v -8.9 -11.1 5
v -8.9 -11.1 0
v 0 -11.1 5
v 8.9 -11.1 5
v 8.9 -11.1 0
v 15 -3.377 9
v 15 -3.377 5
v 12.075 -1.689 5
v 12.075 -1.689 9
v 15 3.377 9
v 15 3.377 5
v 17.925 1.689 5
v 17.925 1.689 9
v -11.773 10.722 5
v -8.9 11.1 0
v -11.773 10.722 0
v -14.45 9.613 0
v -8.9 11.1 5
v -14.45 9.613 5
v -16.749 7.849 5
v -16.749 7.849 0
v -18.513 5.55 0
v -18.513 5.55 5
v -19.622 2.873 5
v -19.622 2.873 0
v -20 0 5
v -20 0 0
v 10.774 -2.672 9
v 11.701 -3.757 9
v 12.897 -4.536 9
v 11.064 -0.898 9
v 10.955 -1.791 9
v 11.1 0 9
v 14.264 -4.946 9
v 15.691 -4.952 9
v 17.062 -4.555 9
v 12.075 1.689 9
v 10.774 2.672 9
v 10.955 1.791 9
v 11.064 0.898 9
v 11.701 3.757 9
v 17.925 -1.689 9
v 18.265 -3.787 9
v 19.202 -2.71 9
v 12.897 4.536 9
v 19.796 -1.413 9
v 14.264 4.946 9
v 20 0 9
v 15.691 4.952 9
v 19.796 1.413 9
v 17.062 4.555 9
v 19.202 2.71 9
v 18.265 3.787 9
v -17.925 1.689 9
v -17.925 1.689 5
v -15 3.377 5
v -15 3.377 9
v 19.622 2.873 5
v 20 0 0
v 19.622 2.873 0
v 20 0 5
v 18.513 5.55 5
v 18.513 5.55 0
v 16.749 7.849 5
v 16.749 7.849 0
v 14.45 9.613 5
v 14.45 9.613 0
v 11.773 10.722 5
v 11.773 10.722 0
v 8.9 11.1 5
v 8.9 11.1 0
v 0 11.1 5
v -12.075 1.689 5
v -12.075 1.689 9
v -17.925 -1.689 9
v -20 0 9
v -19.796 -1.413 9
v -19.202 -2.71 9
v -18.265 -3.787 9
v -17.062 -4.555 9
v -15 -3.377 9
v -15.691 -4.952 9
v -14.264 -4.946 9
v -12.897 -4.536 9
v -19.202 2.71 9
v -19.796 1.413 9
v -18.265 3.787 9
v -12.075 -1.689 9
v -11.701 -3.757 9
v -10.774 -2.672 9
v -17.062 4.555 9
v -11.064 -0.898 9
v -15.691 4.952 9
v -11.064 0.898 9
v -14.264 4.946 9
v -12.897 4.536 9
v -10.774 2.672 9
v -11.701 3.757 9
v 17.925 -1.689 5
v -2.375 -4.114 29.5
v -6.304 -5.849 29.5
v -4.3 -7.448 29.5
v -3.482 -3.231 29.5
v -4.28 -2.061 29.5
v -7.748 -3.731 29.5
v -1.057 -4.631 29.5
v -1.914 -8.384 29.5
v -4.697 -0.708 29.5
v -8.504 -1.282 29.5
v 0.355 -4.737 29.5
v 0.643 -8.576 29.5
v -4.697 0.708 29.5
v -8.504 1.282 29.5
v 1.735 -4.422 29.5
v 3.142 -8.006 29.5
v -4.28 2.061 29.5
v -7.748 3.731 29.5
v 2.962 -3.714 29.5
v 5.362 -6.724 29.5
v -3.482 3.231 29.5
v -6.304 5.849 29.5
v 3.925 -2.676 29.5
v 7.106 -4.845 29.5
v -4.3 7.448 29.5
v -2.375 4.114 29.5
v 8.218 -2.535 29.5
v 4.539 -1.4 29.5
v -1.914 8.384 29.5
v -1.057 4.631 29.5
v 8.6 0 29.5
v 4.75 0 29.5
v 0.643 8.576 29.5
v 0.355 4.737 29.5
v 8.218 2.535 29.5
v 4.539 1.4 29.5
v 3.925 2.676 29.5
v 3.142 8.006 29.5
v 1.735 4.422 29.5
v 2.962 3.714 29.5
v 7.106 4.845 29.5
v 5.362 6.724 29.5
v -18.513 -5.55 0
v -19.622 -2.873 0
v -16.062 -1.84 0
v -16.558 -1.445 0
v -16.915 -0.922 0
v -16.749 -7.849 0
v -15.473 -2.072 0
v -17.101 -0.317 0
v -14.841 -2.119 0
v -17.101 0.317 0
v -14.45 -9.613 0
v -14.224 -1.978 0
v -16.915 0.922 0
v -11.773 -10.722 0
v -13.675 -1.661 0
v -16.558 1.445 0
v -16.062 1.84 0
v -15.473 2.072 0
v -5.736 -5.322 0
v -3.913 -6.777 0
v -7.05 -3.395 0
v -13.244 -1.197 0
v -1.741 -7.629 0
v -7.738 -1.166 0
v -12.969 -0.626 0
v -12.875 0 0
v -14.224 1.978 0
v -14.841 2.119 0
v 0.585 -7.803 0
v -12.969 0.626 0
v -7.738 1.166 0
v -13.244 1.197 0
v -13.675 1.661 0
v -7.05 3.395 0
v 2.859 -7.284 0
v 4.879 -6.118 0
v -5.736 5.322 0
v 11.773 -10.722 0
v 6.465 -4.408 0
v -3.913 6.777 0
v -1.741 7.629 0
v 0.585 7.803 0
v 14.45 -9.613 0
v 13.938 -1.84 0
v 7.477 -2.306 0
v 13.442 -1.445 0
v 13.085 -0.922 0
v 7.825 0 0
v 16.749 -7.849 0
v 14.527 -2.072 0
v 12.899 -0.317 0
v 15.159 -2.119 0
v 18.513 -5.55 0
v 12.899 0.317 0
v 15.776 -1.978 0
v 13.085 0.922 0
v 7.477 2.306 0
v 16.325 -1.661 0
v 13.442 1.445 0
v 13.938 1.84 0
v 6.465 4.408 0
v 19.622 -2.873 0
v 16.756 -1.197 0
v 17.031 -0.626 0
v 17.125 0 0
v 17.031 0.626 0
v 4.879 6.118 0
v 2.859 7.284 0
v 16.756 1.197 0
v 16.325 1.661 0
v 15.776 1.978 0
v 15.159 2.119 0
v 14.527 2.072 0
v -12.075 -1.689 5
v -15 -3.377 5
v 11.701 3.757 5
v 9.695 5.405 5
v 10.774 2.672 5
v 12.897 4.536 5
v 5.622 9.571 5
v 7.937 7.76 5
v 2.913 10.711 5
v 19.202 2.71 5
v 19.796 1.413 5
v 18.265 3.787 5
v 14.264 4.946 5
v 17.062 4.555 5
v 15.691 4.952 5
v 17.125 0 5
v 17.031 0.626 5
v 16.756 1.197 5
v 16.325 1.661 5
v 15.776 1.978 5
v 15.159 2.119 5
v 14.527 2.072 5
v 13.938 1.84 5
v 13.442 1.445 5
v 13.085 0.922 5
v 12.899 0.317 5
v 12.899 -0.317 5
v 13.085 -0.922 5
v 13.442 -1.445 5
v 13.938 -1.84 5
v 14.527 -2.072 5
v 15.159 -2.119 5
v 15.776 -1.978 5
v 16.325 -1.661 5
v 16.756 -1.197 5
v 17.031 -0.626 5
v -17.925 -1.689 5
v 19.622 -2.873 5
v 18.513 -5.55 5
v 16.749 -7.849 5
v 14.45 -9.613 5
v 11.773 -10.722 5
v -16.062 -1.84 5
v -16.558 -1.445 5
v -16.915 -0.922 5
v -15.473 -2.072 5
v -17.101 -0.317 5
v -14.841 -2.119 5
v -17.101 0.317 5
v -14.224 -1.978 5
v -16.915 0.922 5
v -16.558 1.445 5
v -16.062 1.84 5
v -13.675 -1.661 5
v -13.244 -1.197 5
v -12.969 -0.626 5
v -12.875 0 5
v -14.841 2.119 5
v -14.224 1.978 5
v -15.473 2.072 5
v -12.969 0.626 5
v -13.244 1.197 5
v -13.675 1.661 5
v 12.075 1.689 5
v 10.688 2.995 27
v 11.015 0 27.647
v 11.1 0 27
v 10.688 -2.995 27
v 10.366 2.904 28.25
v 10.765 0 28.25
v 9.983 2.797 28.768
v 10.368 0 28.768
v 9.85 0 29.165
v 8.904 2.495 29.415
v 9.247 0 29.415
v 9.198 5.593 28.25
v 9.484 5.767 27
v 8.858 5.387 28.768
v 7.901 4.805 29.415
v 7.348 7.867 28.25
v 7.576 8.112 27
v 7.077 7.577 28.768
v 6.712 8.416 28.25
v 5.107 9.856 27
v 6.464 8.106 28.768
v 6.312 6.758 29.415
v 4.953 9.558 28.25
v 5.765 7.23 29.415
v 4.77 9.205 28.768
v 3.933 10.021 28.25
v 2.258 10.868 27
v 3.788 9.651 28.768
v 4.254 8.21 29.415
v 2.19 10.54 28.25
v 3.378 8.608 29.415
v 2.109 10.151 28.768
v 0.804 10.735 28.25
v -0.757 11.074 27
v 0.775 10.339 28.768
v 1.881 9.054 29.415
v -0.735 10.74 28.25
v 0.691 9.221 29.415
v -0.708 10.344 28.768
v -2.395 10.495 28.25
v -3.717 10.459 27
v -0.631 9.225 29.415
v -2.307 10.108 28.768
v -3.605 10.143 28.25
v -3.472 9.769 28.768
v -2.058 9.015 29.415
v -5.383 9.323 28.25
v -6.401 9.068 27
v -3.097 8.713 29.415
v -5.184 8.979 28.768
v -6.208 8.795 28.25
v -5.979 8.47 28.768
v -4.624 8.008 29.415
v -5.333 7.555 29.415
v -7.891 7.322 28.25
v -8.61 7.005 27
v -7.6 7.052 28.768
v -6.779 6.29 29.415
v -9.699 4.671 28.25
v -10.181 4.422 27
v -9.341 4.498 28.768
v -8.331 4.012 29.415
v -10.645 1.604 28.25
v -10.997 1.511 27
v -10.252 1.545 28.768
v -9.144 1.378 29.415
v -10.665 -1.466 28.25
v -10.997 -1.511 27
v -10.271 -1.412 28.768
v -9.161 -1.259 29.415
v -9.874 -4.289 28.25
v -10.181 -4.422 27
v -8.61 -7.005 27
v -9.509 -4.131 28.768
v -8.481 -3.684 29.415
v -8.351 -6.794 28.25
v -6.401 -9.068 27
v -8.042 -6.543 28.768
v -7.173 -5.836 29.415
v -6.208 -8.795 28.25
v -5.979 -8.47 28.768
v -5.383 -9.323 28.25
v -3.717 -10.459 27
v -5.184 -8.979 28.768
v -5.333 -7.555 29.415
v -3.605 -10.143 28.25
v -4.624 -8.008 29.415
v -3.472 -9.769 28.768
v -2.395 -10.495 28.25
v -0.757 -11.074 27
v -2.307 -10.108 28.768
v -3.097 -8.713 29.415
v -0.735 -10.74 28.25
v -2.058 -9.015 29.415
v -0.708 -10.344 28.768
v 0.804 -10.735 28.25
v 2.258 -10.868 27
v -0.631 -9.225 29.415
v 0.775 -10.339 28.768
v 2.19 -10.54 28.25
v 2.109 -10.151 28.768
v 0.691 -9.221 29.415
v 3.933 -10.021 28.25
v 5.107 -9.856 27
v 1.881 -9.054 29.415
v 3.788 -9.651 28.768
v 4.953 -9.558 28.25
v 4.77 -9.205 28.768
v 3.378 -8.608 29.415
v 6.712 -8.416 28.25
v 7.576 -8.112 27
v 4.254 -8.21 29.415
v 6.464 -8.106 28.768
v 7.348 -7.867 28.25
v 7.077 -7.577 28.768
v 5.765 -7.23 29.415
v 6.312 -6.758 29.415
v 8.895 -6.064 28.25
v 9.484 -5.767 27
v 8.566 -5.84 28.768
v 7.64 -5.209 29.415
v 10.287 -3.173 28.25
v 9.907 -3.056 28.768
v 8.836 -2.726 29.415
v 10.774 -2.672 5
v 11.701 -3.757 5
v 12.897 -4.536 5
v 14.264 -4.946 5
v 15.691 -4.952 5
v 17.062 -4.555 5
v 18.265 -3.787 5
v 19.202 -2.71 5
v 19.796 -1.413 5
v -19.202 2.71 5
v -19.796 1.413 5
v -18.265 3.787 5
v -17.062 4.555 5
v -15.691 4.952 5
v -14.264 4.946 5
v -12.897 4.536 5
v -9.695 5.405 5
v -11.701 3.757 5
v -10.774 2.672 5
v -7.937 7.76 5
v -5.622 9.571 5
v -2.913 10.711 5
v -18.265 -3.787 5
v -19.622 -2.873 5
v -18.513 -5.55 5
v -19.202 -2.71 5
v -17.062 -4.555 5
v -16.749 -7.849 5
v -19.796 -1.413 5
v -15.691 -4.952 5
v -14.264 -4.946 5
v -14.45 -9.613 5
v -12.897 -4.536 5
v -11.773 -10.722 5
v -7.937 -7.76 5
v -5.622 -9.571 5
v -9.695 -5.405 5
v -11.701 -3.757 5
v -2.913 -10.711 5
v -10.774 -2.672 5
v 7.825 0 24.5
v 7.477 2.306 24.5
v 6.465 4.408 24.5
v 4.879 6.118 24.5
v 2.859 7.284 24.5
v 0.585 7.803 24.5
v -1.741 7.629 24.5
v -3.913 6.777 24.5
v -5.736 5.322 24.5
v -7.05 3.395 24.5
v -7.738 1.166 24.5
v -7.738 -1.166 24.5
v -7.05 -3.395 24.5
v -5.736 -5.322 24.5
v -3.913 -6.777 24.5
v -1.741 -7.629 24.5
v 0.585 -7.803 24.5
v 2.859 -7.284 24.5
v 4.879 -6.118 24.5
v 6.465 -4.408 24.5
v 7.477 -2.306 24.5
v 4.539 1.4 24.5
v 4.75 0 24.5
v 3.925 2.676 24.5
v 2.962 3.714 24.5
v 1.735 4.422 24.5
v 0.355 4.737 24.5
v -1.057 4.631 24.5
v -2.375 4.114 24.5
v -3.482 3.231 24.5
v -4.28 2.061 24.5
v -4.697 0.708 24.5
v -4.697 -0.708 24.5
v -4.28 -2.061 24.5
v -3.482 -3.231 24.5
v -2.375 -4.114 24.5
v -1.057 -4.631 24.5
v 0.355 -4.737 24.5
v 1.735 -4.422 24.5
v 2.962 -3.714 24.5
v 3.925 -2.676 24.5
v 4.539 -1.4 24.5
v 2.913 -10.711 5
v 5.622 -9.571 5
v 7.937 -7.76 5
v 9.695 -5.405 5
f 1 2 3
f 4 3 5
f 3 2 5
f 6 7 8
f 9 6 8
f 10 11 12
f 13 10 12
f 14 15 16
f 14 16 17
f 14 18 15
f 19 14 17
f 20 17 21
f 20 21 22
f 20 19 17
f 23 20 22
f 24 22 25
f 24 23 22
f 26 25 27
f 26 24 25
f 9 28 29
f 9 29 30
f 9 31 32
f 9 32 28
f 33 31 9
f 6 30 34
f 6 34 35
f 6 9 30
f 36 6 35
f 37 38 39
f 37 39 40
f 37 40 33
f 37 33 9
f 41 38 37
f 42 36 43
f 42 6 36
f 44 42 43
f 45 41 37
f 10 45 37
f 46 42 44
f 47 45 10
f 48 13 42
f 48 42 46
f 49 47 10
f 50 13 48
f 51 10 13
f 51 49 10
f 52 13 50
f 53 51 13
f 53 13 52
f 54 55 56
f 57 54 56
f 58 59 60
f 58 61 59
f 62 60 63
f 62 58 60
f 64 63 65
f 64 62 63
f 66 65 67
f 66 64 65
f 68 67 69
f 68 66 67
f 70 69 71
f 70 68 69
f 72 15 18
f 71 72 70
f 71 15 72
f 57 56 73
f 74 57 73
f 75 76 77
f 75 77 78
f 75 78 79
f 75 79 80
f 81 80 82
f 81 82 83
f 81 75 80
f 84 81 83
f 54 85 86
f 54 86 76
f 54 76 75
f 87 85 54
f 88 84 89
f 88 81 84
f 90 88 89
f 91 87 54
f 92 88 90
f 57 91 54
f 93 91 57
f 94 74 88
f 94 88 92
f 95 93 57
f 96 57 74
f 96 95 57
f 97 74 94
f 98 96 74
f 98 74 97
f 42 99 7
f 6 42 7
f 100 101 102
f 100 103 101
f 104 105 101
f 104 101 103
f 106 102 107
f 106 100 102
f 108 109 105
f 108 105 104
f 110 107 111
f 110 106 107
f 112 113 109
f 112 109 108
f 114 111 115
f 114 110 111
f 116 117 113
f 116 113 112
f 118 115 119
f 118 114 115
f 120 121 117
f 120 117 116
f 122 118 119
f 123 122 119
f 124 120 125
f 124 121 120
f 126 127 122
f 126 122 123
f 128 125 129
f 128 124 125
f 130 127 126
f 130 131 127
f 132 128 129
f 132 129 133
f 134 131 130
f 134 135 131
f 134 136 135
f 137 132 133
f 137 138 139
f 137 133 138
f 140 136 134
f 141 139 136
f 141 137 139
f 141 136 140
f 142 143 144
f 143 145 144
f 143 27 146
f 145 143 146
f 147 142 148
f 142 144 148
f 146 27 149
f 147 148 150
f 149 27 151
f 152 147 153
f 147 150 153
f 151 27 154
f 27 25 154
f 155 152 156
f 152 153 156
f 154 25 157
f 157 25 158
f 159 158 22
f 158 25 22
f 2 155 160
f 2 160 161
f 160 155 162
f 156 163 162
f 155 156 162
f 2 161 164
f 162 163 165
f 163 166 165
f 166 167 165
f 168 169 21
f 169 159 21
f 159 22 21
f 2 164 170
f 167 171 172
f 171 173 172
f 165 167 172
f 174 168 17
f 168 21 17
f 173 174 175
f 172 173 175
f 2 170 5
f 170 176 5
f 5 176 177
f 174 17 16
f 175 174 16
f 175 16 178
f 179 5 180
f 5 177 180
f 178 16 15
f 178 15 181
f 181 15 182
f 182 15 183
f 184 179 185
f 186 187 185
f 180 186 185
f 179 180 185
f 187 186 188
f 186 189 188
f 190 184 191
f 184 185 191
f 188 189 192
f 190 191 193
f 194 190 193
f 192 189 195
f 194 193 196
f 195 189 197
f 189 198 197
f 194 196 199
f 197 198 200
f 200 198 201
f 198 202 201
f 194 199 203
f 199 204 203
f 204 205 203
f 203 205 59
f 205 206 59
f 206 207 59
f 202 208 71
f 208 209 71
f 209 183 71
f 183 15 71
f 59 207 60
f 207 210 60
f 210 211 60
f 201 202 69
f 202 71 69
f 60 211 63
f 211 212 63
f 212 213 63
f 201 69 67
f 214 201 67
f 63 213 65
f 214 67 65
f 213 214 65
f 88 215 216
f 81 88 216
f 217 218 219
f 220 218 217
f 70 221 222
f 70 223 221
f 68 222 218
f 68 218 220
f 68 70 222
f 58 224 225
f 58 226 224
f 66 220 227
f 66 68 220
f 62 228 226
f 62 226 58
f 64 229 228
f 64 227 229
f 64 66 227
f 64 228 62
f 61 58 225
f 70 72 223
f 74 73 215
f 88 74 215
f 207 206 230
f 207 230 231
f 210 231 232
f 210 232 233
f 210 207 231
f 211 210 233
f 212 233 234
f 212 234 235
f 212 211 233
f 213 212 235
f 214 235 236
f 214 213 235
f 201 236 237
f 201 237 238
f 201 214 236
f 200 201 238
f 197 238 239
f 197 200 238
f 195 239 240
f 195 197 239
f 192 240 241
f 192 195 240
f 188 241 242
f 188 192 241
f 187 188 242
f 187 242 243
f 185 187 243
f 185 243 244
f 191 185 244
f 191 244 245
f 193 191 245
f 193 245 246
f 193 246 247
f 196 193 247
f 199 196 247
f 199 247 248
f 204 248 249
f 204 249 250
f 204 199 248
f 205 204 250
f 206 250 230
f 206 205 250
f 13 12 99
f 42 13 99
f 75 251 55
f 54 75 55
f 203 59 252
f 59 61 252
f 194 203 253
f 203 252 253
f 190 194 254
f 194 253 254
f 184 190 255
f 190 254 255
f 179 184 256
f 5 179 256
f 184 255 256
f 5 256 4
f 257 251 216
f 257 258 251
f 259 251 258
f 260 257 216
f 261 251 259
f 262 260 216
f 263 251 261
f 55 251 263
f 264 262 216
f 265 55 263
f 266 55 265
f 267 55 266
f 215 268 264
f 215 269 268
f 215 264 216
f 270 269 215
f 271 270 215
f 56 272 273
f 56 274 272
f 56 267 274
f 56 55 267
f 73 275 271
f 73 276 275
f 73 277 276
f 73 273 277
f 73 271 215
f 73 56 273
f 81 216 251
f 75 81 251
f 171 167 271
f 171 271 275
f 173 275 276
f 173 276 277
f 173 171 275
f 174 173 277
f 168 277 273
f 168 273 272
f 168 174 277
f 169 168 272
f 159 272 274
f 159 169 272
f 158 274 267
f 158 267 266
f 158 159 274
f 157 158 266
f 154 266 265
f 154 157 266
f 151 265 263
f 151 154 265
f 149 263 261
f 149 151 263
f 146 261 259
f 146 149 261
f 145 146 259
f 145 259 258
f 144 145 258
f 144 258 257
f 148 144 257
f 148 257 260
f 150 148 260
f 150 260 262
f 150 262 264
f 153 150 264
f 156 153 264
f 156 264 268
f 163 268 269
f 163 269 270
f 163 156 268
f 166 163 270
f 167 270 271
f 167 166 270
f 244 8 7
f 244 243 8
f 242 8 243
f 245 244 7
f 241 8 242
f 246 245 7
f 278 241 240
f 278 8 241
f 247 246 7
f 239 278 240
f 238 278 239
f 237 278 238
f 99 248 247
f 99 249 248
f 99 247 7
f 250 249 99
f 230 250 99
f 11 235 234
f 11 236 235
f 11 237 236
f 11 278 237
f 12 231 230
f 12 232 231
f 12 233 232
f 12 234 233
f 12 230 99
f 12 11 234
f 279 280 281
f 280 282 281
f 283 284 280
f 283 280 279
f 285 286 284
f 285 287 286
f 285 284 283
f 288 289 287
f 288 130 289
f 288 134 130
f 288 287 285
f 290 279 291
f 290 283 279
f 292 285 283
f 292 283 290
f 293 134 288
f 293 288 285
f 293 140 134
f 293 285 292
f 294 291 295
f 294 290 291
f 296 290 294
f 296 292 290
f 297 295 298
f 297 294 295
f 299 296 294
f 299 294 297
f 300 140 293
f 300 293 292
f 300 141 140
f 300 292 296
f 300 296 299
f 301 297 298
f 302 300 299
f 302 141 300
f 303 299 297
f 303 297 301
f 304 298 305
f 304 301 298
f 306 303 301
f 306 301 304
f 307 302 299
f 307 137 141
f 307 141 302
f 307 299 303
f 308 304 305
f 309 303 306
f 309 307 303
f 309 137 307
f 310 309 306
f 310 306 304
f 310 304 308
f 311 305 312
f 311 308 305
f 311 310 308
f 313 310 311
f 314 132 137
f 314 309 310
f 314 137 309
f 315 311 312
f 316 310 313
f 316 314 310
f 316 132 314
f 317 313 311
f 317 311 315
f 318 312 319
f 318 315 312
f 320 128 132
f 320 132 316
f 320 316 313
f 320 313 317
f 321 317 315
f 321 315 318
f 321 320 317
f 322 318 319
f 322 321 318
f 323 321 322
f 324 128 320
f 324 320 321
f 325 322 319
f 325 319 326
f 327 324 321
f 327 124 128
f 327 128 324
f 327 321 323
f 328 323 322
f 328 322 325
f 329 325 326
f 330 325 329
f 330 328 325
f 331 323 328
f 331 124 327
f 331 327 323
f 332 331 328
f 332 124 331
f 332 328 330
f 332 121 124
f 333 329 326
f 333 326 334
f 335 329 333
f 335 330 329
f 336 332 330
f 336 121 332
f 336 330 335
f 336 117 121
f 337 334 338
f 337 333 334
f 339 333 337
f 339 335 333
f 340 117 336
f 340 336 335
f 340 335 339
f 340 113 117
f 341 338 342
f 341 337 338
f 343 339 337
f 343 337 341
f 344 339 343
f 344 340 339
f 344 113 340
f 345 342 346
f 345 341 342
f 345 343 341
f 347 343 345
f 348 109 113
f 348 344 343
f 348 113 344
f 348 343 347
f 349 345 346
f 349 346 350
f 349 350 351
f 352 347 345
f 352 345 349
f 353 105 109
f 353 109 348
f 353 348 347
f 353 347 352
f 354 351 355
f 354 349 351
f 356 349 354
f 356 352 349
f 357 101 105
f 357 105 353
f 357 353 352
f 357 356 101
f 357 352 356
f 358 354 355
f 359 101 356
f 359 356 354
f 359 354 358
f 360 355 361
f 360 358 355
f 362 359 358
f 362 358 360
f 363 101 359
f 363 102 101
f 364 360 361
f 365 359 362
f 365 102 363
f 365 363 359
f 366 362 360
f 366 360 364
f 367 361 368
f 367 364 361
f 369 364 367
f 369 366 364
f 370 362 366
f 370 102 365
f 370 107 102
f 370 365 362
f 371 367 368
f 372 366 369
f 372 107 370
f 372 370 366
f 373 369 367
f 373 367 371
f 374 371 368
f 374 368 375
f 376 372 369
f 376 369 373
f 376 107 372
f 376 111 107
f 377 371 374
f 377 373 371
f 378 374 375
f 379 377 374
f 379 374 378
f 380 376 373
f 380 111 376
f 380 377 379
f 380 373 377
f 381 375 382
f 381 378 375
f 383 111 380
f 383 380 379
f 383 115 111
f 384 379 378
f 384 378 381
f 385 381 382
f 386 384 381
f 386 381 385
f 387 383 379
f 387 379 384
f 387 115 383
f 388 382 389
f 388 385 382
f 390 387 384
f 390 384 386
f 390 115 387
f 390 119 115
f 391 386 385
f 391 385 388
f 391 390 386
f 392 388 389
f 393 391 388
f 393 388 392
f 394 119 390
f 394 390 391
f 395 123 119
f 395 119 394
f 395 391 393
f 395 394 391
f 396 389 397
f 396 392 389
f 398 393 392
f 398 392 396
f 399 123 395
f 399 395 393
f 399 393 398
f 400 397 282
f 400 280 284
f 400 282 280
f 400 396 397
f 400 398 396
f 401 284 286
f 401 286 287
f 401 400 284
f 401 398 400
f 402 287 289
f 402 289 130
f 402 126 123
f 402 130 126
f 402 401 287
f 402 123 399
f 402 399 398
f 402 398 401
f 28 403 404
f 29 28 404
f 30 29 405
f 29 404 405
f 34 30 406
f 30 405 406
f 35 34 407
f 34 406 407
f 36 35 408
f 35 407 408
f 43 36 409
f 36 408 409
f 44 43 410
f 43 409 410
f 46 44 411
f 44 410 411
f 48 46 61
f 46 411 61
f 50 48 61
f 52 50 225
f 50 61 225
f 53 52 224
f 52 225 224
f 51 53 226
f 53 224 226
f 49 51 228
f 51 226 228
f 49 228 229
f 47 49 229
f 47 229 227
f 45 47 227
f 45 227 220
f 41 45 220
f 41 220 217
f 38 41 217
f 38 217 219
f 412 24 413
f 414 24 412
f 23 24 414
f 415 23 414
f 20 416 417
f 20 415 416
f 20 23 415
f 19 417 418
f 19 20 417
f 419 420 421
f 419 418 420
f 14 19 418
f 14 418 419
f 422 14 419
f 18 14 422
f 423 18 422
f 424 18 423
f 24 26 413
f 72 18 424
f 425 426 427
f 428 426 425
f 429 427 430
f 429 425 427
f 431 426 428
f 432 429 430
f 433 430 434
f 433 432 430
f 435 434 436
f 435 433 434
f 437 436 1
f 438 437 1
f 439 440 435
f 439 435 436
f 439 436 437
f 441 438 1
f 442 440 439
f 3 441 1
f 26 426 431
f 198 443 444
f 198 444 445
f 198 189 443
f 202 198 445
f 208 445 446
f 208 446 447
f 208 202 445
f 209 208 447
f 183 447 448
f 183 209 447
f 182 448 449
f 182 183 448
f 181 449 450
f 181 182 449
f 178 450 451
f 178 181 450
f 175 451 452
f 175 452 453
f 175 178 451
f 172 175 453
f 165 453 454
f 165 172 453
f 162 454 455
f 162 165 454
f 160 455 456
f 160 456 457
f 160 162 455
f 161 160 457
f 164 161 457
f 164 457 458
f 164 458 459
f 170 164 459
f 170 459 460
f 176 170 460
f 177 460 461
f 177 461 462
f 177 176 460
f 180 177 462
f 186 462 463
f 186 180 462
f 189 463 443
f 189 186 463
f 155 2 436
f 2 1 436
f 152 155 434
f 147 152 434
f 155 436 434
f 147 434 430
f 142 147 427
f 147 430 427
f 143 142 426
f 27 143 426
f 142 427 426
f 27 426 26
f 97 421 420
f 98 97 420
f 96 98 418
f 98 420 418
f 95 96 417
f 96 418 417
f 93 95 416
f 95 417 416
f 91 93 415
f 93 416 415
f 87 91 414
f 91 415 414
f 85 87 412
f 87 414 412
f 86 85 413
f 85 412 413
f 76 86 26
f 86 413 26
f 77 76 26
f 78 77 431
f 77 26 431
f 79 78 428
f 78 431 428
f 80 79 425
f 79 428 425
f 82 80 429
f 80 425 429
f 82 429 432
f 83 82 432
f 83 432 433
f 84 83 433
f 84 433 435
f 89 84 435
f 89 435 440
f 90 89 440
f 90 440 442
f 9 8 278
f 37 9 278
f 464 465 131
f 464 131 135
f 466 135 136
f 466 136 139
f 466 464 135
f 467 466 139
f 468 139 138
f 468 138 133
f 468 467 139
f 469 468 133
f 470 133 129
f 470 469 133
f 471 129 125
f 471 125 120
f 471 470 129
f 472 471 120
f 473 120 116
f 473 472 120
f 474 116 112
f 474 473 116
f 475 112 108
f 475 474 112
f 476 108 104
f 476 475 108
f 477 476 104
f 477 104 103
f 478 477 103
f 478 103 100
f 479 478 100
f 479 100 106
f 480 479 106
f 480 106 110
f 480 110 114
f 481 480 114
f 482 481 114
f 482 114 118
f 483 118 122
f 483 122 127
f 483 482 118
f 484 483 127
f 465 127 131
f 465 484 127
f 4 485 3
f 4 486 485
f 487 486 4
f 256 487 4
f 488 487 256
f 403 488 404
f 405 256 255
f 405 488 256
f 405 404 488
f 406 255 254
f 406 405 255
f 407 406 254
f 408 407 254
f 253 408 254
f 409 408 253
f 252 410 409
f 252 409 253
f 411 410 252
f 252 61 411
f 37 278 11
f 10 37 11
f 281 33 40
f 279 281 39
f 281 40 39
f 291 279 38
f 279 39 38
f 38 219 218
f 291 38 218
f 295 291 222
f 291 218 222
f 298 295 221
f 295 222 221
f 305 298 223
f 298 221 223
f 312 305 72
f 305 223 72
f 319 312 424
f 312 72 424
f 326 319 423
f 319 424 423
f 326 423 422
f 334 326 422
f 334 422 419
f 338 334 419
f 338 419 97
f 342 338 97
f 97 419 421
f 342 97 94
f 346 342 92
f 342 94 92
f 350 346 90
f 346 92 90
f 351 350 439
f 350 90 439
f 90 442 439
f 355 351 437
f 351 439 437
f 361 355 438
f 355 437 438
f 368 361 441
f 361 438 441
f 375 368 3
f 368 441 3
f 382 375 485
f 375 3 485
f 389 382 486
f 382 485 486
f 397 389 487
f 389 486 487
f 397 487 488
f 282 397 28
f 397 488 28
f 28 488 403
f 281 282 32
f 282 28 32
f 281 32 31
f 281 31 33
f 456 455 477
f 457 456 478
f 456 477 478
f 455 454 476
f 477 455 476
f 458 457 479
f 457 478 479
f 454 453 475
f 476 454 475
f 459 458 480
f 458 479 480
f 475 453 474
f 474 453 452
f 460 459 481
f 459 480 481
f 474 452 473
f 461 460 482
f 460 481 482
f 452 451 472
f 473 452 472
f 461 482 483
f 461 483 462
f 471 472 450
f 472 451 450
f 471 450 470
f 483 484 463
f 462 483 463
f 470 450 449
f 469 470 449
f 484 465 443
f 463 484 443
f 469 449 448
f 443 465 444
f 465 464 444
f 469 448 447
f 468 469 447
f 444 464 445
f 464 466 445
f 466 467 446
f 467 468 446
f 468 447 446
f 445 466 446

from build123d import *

# Parameters (mm, degrees)
F0_W     = 40
F0_H     = 22.2
F0_R     = 2.125
F0_R_2   = 7.825
F1_DEPTH = 5
F2_R     = 11.1
F2_R_2   = 7.825
F3_DEPTH = 19.5
F4_R     = 11.1
F4_R_2   = 4.75
F5_DEPTH = 5
F6_R     = 11.09999
F7_R     = 2.5
F8_R     = 5
F9_DEPTH = 4


# Not quite as in the source:
# - a fillet or chamfer is up to 0.001 mm smaller than in the source, because OpenCascade refuses the exact size


with BuildPart() as f1:
    # F0 (on Top) → F1 (new body)
    with BuildSketch(Plane.XY):
        Rectangle(F0_W, F0_H)
        with Locations((-15, 0)):
            Circle(F0_R, mode=Mode.SUBTRACT)
        Circle(F0_R_2, mode=Mode.SUBTRACT)
        with Locations((15, 0)):
            Circle(F0_R, mode=Mode.SUBTRACT)
    extrude(amount=F1_DEPTH)

    # F2 (on face) → F3 (join)
    with BuildSketch(Plane.XY.offset(5)):
        Circle(F2_R)
        Circle(F2_R_2, mode=Mode.SUBTRACT)
    extrude(amount=F3_DEPTH)

    # F4 (on face) → F5 (join)
    with BuildSketch(Plane.XY.offset(24.5)):
        Circle(F4_R)
        Circle(F4_R_2, mode=Mode.SUBTRACT)
    extrude(amount=F5_DEPTH)

    # F6 (radius 11.1 in the source; OpenCascade refuses exactly that, so slightly less here)
    f6_edges = [f1.edges().sort_by_distance(p)[0] for p in [
        (-20, 11.1, 2.5),
        (-20, -11.1, 2.5),
        (20, -11.1, 2.5),
        (20, 11.1, 2.5),
    ]]
    fillet(f6_edges, radius=F6_R)

    # F7
    f7_edges = [f1.edges().sort_by_distance(p)[0] for p in [
        (-11.1, 0, 29.5),
    ]]
    fillet(f7_edges, radius=F7_R)

    # F8 (on face) → F9 (join)
    with BuildSketch(Plane.XY.offset(5)):
        with Locations((-15, 0)):
            Circle(F8_R)
        Polygon((-15, 3.3774990748), (-12.075, 1.6887495374), (-12.075, -1.6887495374), (-15, -3.3774990748), (-17.925, -1.6887495374), (-17.925, 1.6887495374), align=None, mode=Mode.SUBTRACT)
        with Locations((15, 0)):
            Circle(F8_R)
        Polygon((12.075, -1.6887495374), (12.075, 1.6887495374), (15, 3.3774990748), (17.925, 1.6887495374), (17.925, -1.6887495374), (15, -3.3774990748), align=None, mode=Mode.SUBTRACT)
    extrude(amount=F9_DEPTH)


solid = f1.part
